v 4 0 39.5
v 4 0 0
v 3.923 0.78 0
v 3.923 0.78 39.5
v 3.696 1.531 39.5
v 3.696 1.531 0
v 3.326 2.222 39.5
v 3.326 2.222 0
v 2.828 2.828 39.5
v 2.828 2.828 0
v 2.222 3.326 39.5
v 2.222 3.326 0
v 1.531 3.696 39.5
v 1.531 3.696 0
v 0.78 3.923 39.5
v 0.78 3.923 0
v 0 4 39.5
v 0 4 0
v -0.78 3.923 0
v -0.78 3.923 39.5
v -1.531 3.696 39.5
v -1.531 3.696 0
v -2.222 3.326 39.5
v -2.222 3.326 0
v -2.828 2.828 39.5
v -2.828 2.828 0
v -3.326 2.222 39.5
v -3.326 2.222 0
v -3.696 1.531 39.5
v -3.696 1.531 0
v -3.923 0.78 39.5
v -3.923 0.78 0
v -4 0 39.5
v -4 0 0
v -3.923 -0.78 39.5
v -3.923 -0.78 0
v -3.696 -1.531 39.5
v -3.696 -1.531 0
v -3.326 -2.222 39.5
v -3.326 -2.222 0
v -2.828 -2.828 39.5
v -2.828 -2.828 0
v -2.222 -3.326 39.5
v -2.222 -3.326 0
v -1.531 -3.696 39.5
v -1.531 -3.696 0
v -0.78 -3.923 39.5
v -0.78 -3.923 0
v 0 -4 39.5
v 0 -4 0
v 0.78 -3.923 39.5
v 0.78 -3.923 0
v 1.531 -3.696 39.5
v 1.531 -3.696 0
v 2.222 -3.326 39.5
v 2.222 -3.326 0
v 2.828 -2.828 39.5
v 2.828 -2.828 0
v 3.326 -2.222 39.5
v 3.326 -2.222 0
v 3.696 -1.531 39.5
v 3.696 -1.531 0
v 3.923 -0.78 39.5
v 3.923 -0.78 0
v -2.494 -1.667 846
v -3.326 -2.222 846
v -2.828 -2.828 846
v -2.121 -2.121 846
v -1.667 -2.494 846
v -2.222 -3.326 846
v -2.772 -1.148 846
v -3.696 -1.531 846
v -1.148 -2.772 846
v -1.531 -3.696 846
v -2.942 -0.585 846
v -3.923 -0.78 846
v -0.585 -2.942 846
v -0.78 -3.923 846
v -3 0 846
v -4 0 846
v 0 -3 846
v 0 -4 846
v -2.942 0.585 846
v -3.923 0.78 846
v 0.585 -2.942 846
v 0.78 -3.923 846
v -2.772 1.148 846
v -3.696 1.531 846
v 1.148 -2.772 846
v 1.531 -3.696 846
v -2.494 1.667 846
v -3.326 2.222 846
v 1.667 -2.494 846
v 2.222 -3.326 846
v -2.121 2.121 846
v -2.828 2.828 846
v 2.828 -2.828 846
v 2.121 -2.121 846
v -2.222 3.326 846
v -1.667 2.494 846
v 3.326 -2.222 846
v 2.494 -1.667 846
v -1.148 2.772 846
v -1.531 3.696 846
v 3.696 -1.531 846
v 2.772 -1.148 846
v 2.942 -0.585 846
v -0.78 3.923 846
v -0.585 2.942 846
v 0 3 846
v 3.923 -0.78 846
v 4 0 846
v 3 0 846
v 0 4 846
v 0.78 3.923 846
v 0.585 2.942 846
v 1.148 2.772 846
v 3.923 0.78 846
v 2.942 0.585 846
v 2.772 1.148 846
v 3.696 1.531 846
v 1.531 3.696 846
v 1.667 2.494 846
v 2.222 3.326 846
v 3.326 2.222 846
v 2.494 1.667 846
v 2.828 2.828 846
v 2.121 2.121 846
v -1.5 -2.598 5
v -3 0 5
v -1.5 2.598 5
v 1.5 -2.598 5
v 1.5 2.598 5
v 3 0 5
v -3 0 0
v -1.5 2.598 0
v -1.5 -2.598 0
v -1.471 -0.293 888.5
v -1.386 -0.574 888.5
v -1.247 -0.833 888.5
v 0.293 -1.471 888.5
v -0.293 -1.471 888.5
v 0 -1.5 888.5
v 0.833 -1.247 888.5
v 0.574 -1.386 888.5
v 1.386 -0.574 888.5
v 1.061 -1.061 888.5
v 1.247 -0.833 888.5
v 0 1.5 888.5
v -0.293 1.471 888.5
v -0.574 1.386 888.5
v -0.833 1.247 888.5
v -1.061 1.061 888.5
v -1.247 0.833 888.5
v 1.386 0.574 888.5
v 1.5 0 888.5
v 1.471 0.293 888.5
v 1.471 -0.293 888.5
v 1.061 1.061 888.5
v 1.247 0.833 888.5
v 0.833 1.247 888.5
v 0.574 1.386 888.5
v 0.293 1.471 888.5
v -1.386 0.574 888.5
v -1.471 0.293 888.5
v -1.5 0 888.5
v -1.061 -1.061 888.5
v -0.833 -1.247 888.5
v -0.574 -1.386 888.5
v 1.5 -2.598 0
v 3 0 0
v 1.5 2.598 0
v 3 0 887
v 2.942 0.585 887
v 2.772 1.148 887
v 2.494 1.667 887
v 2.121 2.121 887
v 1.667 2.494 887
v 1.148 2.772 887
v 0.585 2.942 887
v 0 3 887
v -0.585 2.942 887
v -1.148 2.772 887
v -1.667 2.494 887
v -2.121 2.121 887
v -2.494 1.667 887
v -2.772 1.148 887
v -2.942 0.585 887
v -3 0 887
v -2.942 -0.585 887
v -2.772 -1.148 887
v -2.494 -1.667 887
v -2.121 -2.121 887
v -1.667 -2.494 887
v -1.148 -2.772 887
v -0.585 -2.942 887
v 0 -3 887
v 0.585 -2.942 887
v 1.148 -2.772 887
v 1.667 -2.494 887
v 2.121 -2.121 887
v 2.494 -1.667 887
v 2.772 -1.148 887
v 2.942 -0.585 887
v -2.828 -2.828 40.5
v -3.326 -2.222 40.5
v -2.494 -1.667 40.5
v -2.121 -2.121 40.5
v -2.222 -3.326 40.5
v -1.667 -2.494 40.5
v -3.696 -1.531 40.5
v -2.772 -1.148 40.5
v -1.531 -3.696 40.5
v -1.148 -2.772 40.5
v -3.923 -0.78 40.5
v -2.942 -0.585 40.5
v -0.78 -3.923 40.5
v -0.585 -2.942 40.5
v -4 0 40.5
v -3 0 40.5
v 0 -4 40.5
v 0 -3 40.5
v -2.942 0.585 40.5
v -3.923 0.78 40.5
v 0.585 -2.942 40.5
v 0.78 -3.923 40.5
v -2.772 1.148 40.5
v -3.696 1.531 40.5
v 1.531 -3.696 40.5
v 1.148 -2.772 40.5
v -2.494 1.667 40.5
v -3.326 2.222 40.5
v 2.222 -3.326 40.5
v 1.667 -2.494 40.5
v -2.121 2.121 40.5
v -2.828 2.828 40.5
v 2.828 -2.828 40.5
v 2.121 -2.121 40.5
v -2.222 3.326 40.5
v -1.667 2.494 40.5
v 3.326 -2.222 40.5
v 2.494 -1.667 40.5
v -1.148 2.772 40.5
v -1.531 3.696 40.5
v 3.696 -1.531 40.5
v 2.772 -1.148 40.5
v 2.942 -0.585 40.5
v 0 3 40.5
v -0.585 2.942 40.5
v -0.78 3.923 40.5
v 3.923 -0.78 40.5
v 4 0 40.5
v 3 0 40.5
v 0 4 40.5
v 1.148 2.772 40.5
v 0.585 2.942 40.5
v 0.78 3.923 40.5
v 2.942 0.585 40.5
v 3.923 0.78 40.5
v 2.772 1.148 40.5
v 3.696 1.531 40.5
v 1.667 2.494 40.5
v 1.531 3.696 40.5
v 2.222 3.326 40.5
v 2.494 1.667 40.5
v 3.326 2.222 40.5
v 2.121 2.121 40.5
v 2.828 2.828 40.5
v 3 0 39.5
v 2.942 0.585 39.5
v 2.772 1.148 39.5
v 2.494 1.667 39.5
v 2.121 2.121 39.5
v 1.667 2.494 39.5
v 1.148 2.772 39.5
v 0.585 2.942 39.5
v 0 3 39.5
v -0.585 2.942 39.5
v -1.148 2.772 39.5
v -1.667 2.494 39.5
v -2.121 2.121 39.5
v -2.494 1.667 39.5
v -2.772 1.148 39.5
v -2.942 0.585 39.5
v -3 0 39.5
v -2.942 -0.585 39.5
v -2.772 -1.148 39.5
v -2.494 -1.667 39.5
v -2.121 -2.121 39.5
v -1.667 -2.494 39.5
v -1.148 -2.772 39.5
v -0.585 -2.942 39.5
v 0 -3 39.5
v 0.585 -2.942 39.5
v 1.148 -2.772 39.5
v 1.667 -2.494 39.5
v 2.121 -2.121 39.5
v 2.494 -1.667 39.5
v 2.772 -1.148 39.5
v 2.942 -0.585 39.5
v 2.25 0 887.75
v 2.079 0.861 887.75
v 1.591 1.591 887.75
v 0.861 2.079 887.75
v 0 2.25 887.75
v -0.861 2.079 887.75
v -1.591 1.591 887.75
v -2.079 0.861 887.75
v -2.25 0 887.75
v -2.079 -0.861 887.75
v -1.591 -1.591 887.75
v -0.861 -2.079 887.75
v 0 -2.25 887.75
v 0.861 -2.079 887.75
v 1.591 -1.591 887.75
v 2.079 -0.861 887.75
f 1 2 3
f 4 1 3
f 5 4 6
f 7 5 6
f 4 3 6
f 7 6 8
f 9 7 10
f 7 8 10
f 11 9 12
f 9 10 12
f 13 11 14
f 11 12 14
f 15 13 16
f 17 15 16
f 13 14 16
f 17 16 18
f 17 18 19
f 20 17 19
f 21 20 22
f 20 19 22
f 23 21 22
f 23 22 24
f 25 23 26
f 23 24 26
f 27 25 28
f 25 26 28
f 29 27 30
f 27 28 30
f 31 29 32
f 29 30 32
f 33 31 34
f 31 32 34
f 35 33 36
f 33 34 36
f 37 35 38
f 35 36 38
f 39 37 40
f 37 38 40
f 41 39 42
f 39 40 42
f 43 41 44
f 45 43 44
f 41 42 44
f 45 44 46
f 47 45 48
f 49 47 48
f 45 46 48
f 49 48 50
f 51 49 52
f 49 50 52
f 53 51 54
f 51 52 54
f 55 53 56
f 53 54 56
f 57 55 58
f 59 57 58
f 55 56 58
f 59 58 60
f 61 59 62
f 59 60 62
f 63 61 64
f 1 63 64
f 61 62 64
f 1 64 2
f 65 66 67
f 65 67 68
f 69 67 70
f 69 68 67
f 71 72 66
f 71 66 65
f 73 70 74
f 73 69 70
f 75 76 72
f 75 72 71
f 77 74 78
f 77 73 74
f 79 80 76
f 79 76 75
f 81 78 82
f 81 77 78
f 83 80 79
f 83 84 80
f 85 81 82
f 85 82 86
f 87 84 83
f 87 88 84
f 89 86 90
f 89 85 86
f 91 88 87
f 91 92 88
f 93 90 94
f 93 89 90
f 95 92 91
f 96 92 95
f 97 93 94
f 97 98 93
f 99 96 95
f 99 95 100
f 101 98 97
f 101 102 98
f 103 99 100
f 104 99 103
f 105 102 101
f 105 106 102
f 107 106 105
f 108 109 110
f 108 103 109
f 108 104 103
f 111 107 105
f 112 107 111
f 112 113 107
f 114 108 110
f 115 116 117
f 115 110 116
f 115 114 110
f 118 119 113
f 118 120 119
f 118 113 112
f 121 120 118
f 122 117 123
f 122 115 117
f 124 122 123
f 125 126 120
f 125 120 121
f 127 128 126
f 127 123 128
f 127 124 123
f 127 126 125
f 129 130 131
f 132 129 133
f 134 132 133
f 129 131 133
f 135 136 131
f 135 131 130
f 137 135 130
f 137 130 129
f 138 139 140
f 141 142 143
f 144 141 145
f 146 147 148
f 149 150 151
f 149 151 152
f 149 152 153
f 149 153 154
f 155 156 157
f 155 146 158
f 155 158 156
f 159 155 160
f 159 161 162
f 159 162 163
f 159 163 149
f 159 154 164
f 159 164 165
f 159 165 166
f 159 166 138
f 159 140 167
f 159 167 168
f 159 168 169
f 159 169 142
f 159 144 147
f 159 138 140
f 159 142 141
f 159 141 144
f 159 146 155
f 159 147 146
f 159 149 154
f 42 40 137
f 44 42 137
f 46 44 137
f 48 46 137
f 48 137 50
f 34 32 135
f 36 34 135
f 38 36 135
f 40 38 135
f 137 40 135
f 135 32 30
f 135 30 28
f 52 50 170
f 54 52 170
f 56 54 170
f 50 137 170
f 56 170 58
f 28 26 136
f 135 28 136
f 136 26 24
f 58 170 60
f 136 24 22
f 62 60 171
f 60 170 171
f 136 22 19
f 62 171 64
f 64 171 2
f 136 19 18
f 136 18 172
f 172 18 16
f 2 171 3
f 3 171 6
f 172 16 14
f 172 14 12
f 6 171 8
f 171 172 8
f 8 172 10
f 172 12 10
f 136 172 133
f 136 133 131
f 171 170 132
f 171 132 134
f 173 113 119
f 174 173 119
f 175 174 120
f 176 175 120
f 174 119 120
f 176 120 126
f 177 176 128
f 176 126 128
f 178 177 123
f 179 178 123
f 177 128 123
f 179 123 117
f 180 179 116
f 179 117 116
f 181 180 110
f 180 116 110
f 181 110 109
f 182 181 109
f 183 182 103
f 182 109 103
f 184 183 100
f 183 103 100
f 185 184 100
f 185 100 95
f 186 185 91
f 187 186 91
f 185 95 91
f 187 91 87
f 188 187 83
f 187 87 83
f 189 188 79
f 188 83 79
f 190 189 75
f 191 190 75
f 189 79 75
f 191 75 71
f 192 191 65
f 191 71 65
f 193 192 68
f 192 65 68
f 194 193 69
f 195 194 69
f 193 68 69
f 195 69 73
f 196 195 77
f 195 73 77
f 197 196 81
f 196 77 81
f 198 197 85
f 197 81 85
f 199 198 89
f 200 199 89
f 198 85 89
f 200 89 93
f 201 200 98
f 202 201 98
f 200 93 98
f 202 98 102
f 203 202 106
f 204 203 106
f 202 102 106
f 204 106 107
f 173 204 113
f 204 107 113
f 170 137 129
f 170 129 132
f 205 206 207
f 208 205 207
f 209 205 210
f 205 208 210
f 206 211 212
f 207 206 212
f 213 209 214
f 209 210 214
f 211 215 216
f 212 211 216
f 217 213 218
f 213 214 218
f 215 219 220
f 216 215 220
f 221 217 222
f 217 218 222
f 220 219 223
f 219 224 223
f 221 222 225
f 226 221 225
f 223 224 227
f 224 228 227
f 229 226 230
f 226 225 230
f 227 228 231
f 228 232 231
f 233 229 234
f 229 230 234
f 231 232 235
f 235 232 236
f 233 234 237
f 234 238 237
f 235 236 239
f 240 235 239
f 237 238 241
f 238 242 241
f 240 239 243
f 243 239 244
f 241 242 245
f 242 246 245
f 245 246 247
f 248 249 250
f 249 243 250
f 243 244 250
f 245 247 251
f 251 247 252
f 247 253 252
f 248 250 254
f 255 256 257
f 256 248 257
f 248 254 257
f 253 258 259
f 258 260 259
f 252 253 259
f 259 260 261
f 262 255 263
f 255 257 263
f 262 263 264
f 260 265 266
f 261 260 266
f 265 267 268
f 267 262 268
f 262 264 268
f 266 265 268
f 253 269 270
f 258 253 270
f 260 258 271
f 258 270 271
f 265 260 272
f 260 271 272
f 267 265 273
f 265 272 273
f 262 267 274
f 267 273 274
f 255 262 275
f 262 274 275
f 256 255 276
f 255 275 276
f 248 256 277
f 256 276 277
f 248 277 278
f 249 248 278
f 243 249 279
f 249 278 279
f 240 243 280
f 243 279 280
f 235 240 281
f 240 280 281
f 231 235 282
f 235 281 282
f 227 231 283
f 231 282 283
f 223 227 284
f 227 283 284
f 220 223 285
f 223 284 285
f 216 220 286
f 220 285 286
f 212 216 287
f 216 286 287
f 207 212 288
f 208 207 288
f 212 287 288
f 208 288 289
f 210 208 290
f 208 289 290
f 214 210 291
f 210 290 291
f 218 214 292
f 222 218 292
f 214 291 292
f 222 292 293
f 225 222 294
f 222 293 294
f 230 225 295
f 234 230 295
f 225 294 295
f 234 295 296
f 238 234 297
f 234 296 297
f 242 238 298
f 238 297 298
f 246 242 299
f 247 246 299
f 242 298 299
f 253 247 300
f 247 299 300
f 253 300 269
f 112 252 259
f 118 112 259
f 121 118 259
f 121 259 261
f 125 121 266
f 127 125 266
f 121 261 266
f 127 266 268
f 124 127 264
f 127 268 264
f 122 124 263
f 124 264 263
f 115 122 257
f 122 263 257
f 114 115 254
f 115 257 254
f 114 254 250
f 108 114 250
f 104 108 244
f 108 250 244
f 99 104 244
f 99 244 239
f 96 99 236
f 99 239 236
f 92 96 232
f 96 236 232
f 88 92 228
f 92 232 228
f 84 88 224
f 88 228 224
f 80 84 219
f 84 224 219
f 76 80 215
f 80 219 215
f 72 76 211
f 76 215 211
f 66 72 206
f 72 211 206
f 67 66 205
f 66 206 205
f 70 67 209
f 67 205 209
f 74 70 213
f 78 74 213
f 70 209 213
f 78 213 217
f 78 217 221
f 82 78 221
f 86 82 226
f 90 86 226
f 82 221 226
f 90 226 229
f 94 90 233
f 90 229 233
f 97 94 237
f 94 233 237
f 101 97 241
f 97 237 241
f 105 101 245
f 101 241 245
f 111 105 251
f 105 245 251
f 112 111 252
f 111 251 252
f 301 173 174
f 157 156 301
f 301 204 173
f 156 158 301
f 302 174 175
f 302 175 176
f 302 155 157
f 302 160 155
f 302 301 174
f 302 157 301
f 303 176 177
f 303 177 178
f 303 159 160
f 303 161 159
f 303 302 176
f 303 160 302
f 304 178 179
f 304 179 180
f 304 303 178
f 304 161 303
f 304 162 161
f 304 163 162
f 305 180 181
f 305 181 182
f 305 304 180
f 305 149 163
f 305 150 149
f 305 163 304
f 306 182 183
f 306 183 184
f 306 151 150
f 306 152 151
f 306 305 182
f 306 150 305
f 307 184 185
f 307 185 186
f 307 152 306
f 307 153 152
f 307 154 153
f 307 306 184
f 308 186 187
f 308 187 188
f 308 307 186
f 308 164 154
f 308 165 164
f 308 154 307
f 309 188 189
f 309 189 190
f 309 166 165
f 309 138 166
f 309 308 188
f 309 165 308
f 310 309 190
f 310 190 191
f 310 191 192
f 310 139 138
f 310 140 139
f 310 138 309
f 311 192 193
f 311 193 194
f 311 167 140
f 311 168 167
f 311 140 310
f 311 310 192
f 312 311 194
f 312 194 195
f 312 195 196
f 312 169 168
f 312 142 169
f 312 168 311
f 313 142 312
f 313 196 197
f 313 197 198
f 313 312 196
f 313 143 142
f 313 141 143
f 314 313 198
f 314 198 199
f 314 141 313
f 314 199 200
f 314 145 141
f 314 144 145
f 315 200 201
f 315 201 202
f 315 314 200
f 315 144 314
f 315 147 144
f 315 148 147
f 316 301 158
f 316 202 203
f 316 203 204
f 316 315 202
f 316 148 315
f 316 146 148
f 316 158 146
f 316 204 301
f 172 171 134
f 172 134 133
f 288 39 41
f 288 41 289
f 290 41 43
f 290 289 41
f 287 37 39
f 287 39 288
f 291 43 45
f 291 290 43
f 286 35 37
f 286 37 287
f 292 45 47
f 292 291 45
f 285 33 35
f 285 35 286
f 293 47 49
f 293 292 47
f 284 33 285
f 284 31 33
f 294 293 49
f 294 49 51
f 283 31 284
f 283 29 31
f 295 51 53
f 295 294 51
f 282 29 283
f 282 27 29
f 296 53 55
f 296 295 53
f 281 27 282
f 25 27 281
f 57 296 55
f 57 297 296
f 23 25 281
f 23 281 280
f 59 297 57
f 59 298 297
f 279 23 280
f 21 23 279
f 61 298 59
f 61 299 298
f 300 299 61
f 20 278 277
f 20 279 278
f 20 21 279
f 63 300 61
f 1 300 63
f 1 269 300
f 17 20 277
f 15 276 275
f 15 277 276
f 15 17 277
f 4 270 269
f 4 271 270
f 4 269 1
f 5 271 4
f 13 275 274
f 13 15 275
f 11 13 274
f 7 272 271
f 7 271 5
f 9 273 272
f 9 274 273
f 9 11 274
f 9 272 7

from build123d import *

# Parameters (mm, degrees)
SKETCH_1_R          = 4
EXTRUDE_1_DEPTH     = 39.5
SKETCH_2_R          = 3
EXTRUDE_2_DEPTH     = 1
SKETCH_3_R          = 4
EXTRUDE_3_DEPTH     = 805.5
SKETCH_4_R          = 3
EXTRUDE_4_DEPTH     = 42.5
CUT_EXTRUDE_1_DEPTH = 5
CHAMFER_1_SIZE      = 1.5


with BuildPart() as part:
    # 草图1 → 凸台-拉伸1 (new body)
    with BuildSketch(Plane.XY):
        Circle(SKETCH_1_R)
    extrude(amount=EXTRUDE_1_DEPTH)

    # 草图2 → 凸台-拉伸2 (add)
    with BuildSketch(Plane.XY.offset(39.5)):
        Circle(SKETCH_2_R)
    extrude(amount=EXTRUDE_2_DEPTH)

    # 草图3 → 凸台-拉伸3 (add)
    with BuildSketch(Plane.XY.offset(40.5)):
        Circle(SKETCH_3_R)
    extrude(amount=EXTRUDE_3_DEPTH)

    # 草图4 → 凸台-拉伸4 (add)
    with BuildSketch(Plane.XY.offset(846)):
        Circle(SKETCH_4_R)
    extrude(amount=EXTRUDE_4_DEPTH)

    # 草图7 → 切除-拉伸1 (cut)
    with BuildSketch(Plane(origin=(0, 0, 0), x_dir=(-1, 0, 0), z_dir=(0, 0, -1))):
        Polygon((3, 0), (1.5, -2.598076211), (-1.5, -2.598076211), (-3, 0), (-1.5, 2.598076211), (1.5, 2.598076211), align=None)
    extrude(amount=-CUT_EXTRUDE_1_DEPTH, mode=Mode.SUBTRACT)

    # 倒角1
    chamfer_1_edges = [part.edges().sort_by_distance(p)[0] for p in [
        (-3, 0, 888.5),
    ]]
    chamfer(chamfer_1_edges, length=CHAMFER_1_SIZE)


solid = part.part
